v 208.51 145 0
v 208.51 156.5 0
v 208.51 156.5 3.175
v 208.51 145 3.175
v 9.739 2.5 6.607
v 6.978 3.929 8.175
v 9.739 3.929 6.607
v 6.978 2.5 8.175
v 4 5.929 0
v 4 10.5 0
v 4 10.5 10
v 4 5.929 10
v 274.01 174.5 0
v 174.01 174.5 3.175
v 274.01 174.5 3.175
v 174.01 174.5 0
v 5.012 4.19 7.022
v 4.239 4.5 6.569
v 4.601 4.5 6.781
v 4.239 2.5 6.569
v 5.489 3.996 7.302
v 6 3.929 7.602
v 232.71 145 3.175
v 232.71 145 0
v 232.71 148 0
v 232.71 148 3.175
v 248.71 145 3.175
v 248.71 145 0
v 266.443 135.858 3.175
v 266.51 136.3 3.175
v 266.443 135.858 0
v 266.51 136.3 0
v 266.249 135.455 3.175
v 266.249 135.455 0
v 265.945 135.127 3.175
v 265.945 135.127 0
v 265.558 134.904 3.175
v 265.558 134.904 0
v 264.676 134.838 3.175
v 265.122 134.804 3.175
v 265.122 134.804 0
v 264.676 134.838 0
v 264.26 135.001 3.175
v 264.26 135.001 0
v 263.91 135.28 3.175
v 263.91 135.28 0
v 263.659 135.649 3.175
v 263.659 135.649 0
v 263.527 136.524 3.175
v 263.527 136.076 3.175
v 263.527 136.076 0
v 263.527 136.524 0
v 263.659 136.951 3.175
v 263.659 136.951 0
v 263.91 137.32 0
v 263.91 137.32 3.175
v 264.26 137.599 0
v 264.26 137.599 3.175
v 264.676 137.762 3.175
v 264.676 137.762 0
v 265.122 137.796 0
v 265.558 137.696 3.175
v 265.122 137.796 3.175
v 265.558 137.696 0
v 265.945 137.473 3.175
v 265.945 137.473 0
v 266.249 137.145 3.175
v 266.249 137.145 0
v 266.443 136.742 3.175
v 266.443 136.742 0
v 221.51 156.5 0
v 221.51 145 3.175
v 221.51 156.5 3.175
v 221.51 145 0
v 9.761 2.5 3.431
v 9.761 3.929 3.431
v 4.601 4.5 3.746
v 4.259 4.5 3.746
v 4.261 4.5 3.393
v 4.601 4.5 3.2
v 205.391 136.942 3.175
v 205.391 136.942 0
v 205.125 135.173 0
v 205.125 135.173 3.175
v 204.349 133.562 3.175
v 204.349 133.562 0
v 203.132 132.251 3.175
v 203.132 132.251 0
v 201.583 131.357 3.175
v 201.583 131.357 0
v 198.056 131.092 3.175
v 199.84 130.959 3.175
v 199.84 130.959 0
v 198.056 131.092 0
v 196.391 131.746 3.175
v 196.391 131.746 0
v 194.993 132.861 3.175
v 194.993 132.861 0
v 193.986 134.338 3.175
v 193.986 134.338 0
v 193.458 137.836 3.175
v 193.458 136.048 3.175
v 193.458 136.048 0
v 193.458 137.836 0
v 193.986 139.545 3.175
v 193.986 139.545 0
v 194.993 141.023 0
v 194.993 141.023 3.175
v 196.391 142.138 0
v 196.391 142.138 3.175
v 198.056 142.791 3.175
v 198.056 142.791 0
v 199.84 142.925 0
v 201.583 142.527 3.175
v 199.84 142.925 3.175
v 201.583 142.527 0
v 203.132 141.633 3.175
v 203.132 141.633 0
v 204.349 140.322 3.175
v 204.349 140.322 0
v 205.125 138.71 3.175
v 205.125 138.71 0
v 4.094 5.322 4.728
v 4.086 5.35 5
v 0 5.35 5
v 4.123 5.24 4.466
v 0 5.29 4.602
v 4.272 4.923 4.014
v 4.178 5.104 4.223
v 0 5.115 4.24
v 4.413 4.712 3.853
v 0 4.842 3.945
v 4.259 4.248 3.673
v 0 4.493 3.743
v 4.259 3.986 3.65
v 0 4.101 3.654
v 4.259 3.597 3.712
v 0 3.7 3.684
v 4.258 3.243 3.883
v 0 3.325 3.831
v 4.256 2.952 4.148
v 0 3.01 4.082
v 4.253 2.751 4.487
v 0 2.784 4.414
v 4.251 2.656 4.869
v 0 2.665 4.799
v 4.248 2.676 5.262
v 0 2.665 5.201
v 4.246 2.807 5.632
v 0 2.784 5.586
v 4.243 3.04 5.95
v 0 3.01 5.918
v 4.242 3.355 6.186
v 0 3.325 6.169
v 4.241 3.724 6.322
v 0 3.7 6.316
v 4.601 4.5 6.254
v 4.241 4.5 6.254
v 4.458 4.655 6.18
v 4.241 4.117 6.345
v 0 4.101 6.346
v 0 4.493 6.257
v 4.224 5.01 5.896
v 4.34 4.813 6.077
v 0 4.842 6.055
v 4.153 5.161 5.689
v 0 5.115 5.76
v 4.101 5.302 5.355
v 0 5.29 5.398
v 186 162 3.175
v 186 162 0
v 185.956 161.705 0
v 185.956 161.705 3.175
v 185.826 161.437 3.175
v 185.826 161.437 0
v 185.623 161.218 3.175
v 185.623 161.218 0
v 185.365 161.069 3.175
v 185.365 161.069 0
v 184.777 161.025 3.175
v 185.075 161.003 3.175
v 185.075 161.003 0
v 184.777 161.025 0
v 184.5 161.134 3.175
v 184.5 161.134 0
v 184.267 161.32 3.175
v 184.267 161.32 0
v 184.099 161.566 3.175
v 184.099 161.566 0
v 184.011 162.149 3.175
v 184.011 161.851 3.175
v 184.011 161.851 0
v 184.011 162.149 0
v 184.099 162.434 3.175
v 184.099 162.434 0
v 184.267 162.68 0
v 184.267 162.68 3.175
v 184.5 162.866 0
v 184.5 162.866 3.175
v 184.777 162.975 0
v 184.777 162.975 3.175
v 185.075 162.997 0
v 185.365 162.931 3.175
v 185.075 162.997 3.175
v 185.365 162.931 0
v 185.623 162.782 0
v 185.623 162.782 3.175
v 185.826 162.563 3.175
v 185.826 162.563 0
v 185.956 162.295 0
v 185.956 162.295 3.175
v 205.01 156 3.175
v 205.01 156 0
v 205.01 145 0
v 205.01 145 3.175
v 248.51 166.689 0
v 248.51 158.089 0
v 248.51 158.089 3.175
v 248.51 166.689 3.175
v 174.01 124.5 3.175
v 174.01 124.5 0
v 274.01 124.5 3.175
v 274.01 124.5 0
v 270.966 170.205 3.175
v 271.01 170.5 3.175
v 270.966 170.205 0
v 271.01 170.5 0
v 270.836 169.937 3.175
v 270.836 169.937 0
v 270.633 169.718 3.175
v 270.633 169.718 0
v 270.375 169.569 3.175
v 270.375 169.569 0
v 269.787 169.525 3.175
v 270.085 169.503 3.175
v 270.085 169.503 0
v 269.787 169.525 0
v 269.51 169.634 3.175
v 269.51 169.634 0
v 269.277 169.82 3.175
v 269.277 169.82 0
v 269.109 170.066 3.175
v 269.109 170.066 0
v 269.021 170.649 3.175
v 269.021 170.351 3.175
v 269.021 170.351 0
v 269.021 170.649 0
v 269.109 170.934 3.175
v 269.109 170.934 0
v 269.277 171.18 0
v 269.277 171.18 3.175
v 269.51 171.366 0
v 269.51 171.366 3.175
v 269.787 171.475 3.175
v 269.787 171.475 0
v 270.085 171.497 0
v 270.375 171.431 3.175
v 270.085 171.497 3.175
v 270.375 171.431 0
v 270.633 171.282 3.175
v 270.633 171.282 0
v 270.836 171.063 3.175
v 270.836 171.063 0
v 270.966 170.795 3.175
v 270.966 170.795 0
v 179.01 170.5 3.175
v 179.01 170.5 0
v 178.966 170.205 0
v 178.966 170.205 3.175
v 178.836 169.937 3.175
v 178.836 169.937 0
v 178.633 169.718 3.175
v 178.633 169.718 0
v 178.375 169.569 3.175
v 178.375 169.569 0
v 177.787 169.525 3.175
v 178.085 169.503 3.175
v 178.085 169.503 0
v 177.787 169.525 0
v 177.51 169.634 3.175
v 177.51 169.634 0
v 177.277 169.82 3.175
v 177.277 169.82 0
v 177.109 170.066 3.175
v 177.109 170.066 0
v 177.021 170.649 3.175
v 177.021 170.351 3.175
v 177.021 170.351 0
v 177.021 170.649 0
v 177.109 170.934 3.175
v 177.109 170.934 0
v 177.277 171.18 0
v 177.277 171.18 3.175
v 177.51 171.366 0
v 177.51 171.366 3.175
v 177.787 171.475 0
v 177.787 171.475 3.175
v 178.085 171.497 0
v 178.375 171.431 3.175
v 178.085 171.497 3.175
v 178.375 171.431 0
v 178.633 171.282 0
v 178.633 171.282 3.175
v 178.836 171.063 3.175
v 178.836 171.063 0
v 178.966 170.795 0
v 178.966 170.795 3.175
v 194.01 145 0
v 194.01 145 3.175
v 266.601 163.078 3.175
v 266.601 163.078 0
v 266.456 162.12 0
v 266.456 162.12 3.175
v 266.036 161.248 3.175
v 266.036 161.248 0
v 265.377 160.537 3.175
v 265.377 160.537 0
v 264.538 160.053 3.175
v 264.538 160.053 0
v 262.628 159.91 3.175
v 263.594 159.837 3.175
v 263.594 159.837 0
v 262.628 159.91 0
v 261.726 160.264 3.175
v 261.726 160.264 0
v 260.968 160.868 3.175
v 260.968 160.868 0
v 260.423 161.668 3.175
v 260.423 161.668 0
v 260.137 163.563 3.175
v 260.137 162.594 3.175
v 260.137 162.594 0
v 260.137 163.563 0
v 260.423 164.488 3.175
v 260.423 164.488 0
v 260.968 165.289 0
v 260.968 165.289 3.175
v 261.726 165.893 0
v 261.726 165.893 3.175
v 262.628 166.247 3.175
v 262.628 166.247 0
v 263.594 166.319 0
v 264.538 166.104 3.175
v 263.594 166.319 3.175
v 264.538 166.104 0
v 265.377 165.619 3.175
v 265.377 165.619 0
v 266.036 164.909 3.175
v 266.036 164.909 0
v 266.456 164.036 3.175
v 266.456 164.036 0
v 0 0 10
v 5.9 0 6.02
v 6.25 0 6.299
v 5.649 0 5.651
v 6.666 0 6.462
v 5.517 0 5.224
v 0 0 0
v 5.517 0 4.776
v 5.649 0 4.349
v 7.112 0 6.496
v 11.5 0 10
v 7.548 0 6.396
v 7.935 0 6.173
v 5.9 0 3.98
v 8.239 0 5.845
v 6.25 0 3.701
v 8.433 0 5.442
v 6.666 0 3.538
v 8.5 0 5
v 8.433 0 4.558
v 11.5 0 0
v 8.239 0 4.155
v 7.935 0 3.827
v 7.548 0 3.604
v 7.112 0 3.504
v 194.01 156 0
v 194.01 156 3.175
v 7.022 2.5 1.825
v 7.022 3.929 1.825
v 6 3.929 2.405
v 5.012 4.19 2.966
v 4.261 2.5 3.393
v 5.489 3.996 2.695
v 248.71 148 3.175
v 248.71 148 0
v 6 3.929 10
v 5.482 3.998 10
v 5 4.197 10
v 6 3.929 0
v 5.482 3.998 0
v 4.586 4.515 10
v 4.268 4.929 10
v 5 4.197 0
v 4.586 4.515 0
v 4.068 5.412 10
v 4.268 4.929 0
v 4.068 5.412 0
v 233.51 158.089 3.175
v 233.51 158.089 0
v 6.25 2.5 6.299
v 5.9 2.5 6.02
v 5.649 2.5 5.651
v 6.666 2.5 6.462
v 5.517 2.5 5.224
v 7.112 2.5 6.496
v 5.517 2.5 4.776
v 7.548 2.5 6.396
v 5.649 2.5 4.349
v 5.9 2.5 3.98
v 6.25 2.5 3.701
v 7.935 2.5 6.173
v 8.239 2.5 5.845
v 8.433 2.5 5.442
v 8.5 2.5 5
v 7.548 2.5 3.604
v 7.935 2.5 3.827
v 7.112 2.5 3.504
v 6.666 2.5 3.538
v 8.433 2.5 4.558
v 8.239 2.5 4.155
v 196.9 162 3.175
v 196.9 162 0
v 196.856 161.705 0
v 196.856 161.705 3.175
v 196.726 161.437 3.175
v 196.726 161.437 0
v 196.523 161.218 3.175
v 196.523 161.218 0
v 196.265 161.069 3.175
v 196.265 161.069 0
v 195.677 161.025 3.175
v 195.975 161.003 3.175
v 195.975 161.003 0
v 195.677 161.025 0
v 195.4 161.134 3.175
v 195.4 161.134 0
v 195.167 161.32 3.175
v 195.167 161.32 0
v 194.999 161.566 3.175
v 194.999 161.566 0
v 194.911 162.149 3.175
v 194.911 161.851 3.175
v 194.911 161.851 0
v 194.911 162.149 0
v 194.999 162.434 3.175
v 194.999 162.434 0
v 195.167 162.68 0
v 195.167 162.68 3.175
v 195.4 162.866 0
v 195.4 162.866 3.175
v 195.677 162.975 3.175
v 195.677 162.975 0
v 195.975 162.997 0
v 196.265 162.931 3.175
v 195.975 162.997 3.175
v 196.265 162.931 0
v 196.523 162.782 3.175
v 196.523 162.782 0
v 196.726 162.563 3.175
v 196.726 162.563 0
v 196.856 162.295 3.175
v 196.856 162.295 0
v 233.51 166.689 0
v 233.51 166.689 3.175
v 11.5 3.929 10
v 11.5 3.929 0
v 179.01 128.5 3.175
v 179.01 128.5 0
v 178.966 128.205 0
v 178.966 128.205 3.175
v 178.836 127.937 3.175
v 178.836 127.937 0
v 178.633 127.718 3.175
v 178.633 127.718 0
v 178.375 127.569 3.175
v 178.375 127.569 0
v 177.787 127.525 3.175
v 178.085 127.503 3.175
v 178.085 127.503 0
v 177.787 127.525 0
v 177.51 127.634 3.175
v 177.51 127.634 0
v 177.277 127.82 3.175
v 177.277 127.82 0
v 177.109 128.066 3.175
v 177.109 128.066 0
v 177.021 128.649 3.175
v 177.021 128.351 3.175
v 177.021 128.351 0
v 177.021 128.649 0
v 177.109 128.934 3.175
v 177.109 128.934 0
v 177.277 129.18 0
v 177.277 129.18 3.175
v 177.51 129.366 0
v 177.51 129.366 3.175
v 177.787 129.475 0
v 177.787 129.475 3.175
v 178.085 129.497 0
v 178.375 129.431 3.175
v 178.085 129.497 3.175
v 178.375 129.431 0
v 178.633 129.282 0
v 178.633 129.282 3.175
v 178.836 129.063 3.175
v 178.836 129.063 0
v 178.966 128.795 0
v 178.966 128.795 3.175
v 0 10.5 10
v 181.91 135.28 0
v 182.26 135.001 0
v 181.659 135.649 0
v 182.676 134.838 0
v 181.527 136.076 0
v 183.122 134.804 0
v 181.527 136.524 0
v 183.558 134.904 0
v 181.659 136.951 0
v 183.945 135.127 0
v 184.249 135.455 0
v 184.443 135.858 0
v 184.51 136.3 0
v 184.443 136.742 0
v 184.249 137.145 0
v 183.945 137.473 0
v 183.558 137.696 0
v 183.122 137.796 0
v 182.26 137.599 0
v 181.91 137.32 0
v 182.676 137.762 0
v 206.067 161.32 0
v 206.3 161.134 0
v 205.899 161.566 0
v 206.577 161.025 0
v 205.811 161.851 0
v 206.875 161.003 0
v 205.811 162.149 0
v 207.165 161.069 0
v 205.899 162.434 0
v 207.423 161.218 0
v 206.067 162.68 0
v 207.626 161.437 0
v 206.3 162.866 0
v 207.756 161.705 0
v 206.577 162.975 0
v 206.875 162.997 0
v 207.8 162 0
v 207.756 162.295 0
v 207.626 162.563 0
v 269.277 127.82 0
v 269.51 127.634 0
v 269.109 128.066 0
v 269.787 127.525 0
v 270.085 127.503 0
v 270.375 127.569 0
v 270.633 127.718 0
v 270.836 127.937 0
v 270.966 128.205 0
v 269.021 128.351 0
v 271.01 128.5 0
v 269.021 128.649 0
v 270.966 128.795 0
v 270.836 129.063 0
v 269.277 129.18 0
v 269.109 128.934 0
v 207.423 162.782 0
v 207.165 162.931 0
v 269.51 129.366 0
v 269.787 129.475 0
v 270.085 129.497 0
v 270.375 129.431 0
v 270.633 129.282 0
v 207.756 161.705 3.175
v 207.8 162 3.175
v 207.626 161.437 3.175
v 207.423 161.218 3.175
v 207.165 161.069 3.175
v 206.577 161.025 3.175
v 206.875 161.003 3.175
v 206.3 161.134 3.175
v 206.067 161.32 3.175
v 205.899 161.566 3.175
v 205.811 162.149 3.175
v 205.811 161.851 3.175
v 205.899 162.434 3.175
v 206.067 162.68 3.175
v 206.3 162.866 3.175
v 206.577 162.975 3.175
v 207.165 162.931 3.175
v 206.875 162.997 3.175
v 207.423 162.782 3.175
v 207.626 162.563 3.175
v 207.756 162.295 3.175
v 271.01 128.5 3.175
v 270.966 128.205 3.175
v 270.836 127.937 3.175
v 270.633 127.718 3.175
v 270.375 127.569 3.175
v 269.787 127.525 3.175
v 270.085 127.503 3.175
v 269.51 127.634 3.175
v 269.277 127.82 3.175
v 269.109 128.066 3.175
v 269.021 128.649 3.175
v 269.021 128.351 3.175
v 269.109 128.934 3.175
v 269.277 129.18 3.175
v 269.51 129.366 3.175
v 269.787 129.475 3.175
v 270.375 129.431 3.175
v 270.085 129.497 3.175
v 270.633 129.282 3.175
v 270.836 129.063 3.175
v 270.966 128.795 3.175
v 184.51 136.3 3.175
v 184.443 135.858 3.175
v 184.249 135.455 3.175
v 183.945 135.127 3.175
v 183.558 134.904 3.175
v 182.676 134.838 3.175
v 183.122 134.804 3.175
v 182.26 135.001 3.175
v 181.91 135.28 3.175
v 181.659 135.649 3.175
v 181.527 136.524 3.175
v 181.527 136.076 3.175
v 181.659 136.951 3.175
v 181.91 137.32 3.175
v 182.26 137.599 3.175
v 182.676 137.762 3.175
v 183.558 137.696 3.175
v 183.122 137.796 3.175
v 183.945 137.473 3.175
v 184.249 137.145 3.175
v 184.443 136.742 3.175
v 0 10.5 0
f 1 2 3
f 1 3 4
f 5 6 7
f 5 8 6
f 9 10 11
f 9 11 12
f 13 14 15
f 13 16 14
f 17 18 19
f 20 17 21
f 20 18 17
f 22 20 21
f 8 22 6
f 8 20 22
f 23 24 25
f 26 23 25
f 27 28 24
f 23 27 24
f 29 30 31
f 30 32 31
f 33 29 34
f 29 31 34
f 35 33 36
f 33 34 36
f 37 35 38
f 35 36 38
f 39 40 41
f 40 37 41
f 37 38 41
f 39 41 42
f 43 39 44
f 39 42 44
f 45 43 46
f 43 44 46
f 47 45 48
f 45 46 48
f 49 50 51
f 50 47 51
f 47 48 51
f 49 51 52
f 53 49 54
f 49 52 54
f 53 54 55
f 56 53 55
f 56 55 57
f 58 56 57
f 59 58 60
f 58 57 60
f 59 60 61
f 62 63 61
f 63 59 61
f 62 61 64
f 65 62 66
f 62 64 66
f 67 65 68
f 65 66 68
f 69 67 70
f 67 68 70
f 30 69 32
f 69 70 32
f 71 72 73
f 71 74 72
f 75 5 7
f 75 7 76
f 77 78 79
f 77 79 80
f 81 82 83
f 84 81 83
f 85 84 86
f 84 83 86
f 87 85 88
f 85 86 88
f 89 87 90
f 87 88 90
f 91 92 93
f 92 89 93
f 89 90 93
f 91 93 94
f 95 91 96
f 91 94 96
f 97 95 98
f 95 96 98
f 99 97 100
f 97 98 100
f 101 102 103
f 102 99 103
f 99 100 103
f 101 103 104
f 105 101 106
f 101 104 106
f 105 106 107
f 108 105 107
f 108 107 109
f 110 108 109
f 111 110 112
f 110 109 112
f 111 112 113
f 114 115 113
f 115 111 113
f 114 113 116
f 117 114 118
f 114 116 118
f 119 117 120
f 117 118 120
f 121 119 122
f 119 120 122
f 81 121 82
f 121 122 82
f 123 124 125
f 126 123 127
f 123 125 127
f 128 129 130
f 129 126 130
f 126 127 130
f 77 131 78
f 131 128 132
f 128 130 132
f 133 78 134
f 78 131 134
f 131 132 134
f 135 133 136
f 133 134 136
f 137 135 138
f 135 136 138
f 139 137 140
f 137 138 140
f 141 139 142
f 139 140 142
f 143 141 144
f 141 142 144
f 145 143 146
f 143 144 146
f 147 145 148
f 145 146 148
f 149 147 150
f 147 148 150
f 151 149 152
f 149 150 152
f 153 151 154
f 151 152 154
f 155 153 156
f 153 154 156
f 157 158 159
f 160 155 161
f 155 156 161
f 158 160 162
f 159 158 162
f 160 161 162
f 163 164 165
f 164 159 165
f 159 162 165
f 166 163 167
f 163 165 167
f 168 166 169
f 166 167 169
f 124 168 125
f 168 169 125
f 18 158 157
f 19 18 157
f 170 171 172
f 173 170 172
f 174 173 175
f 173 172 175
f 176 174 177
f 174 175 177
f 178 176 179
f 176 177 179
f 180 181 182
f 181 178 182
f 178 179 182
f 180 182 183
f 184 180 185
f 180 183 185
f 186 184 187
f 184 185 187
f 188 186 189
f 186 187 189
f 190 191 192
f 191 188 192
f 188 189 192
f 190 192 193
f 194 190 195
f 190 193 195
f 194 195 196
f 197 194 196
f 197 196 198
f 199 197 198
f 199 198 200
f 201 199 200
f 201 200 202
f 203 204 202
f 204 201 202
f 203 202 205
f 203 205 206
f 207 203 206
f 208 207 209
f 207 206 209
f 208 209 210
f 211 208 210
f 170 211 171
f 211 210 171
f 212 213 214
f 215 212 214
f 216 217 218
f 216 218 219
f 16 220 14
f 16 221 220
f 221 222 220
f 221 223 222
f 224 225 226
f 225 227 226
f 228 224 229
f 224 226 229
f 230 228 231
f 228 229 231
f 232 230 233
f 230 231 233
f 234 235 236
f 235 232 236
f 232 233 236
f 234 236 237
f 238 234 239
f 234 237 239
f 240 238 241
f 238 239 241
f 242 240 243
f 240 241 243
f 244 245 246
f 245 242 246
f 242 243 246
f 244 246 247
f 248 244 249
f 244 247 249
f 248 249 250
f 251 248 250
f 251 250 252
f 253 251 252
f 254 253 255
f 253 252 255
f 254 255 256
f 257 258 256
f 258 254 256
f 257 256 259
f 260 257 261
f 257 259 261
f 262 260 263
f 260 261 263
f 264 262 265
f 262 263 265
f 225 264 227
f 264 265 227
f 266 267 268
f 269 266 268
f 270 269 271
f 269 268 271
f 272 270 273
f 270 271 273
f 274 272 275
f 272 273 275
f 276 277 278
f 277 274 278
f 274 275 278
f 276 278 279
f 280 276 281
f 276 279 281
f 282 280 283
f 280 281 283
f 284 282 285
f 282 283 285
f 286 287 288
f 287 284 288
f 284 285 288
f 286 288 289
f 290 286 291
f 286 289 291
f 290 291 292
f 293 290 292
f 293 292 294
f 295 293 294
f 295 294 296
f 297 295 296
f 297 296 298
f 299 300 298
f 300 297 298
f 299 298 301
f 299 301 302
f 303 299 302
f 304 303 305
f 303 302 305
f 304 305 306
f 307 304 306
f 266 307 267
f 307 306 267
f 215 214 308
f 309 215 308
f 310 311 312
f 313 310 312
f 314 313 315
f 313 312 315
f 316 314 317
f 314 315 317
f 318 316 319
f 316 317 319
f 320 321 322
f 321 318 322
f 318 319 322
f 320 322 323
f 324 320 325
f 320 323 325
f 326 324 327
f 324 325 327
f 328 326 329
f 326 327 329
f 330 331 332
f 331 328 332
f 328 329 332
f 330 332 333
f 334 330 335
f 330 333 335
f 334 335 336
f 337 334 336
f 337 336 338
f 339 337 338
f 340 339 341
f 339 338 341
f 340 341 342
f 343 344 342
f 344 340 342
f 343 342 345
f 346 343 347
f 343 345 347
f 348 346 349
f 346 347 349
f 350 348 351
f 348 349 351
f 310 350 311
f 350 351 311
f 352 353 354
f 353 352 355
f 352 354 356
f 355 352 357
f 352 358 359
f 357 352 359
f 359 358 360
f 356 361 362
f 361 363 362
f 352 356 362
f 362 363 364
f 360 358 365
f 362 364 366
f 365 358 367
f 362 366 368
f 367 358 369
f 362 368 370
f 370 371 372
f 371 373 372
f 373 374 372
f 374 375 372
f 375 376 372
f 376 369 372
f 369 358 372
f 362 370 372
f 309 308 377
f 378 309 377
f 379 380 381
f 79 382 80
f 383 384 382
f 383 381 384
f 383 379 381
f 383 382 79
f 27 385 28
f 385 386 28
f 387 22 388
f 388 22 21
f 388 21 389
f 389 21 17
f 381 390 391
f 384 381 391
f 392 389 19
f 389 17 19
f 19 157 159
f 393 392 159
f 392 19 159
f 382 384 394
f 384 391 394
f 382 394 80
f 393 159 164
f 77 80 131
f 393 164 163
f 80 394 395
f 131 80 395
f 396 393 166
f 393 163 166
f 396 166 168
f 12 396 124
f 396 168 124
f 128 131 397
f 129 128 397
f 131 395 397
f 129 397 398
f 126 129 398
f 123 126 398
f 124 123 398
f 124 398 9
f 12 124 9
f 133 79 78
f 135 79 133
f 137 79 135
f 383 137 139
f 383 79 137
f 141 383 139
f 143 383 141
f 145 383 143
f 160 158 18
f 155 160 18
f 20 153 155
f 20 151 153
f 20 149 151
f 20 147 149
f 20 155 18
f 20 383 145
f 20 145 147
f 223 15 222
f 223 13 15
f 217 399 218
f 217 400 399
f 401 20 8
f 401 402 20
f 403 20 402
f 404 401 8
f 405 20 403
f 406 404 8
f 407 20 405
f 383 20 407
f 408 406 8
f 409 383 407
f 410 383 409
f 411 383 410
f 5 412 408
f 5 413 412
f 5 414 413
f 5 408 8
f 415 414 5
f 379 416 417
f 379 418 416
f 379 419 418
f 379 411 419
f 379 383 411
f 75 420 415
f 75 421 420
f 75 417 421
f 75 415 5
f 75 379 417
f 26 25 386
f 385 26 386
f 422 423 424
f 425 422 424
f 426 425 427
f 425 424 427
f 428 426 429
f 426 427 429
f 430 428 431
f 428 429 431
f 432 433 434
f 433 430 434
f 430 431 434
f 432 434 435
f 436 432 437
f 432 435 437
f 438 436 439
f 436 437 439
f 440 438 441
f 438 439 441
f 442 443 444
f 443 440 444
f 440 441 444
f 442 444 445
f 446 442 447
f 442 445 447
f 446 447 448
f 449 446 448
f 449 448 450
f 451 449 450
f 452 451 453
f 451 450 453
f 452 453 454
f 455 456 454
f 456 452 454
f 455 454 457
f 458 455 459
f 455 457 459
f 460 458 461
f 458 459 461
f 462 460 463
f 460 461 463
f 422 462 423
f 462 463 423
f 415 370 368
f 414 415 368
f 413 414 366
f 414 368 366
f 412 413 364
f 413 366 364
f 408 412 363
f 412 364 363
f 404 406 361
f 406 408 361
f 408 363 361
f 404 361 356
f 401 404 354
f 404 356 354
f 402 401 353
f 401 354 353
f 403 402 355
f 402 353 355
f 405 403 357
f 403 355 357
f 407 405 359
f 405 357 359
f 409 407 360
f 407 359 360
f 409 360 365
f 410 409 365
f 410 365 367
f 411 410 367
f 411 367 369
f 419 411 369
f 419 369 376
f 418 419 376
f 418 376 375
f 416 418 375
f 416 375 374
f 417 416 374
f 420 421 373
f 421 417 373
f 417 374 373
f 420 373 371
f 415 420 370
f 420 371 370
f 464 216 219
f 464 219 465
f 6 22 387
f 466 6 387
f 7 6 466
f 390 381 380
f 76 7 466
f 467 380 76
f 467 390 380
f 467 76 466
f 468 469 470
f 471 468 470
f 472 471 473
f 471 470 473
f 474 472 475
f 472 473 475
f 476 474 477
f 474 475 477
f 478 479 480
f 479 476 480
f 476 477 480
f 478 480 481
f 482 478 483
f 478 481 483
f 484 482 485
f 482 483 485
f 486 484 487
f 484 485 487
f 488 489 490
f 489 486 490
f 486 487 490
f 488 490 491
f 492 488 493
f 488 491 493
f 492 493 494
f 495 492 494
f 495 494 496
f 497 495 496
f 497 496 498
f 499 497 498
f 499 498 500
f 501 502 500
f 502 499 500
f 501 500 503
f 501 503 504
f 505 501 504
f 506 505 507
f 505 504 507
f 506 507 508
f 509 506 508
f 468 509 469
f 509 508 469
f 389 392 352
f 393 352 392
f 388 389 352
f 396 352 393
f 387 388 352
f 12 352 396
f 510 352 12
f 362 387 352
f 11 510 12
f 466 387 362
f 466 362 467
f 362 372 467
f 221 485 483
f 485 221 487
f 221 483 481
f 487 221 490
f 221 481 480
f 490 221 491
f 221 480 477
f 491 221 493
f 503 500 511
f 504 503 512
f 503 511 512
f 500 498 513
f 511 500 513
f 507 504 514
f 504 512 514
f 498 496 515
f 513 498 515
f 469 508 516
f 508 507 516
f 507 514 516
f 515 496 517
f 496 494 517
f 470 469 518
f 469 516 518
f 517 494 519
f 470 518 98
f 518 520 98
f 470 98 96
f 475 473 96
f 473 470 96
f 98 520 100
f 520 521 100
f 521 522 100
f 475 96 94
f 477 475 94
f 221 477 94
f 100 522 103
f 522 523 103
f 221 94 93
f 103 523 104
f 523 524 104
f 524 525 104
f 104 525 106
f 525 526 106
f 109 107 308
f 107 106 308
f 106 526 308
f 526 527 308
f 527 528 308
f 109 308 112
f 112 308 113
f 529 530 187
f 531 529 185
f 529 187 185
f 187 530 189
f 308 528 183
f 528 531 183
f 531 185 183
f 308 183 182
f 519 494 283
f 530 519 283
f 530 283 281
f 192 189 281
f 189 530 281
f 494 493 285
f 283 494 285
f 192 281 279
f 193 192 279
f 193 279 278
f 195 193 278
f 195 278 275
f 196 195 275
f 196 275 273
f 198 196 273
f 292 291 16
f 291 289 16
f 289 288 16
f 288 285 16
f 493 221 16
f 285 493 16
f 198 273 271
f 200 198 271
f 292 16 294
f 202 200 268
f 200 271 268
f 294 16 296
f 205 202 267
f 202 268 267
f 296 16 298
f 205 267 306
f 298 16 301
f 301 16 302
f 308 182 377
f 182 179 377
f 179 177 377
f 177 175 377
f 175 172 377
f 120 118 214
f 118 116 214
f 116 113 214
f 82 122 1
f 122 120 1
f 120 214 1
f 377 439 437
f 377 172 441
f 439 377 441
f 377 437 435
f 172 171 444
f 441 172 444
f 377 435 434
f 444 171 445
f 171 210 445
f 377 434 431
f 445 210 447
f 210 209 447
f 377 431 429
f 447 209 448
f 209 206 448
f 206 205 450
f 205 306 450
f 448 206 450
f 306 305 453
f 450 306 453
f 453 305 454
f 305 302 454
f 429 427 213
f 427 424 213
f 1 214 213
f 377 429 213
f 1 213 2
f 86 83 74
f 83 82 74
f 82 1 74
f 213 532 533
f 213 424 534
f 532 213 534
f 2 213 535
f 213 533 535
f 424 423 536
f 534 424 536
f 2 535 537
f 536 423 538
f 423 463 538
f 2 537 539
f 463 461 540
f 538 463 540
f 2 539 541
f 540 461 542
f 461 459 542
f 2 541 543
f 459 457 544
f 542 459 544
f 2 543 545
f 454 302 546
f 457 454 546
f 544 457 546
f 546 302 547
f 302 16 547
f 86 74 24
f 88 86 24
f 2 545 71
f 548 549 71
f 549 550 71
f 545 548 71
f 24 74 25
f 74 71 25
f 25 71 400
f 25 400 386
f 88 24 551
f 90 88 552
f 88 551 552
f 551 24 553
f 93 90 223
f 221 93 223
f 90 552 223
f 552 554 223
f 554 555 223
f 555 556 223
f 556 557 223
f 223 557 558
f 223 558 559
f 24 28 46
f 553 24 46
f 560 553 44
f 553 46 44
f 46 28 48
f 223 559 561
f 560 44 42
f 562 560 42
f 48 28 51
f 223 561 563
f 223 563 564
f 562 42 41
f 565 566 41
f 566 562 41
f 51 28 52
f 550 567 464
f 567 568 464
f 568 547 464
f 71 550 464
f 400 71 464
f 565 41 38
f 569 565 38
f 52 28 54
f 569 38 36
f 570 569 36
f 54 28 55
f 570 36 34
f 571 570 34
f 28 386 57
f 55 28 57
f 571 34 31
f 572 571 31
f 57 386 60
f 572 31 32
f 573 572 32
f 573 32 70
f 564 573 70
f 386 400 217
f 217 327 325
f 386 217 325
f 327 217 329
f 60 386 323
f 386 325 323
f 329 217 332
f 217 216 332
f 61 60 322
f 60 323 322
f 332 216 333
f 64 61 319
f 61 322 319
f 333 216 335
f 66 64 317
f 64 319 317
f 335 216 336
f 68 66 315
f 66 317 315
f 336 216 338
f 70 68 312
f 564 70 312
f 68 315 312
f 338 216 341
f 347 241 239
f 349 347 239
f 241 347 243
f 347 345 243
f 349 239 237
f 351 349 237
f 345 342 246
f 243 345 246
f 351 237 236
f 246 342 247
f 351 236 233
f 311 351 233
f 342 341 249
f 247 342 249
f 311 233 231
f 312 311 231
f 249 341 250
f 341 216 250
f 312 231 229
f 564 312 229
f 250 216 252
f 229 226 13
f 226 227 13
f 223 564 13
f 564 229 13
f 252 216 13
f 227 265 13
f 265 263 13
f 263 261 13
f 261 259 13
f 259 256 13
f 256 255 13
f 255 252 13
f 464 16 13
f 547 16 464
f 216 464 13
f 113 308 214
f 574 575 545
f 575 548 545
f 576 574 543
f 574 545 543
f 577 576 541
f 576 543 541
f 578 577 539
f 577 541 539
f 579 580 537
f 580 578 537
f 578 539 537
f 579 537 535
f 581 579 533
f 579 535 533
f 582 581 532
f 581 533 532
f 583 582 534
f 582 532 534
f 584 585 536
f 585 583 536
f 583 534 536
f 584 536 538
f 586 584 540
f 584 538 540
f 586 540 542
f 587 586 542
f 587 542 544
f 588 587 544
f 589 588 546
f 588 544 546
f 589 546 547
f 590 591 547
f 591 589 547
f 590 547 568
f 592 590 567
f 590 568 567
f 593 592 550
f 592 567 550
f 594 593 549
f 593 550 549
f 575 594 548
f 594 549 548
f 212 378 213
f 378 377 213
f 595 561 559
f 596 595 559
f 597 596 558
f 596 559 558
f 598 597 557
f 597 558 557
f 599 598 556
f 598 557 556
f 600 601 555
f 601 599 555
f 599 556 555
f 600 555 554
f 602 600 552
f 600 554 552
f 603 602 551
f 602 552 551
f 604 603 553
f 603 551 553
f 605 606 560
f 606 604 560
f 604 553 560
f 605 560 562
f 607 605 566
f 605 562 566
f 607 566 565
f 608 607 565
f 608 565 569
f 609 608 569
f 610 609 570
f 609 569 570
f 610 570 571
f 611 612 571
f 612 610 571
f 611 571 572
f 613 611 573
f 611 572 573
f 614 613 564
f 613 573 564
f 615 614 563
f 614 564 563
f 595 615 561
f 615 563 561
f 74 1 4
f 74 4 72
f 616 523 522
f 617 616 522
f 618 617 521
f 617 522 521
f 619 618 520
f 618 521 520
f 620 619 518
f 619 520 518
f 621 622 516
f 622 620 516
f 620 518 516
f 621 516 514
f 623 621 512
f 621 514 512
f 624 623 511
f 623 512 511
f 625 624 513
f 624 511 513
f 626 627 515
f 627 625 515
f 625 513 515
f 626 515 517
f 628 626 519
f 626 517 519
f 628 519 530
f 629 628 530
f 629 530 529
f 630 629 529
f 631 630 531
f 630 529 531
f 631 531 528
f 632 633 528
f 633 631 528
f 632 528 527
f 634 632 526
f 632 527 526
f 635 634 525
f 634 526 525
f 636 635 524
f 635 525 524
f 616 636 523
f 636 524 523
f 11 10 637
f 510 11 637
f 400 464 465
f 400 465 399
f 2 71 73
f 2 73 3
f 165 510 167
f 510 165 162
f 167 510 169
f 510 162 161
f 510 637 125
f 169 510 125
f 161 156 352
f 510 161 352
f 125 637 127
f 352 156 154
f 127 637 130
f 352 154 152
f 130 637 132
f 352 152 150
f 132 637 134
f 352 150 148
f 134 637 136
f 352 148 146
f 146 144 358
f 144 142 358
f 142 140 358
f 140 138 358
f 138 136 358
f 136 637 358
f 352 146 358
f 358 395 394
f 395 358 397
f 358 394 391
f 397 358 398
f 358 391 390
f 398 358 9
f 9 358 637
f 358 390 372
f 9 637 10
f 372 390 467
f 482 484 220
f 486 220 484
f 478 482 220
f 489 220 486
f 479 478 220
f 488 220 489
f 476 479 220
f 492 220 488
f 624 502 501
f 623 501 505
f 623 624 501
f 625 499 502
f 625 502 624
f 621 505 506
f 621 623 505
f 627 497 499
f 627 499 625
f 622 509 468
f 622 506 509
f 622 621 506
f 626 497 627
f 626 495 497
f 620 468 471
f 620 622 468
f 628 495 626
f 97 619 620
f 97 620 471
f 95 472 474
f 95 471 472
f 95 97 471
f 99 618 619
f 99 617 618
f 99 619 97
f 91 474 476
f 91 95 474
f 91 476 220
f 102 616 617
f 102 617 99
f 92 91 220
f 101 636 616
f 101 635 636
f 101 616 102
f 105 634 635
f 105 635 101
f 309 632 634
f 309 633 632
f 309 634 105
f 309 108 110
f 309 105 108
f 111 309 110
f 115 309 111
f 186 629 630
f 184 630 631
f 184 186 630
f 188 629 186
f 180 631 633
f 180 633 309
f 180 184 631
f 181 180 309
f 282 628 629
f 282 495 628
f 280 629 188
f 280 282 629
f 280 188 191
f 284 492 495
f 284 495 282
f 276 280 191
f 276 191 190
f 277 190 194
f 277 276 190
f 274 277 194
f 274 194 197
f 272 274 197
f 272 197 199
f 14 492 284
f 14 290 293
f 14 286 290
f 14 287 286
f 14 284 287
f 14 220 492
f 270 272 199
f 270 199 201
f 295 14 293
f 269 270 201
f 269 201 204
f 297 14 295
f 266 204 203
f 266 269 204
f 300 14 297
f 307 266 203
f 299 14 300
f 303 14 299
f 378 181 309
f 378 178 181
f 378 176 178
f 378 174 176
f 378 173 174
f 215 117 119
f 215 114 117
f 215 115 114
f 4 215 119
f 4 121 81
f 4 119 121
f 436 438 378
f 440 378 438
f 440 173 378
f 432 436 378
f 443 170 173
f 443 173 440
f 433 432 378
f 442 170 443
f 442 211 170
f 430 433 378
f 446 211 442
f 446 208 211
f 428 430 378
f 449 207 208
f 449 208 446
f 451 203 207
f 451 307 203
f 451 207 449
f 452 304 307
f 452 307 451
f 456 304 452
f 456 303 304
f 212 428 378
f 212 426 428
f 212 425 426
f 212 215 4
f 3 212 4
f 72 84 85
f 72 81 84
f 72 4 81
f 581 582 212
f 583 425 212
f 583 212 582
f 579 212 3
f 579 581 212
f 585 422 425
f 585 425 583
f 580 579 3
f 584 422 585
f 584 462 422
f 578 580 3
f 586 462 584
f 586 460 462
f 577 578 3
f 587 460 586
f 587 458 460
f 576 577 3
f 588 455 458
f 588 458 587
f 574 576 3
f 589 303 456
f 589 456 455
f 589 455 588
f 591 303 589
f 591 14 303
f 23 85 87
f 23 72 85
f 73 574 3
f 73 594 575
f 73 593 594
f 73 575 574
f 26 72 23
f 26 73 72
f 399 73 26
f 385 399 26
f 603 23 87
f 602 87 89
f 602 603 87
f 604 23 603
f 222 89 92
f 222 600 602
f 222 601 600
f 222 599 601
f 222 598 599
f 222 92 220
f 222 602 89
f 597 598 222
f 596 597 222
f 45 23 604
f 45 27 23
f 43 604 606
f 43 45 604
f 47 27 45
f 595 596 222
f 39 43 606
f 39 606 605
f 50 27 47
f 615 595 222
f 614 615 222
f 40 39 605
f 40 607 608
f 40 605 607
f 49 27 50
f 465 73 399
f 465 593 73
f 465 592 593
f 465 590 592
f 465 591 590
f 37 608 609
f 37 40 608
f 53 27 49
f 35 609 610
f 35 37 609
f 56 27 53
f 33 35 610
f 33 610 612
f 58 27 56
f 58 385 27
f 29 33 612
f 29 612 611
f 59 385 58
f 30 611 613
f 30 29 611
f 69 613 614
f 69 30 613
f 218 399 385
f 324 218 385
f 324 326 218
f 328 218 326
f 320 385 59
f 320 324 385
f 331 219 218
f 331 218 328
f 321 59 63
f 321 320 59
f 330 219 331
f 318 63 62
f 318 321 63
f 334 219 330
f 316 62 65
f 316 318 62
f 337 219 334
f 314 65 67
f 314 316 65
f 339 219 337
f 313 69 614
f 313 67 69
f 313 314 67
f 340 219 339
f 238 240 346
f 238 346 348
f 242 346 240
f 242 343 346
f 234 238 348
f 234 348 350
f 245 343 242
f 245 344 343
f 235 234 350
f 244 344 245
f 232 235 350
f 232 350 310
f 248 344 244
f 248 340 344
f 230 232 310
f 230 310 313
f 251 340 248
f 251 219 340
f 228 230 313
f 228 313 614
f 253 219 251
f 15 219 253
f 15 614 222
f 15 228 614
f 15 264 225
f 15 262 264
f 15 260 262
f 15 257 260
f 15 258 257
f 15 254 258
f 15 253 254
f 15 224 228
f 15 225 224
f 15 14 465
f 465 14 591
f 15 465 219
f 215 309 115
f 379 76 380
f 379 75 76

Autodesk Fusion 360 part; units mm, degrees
sketch "back content" plane through (0, 0, 0) normal (0, 0, 1) x (1, 0, 0)
  line L0 (174.01, 174.5) -> (274.01, 174.5)
  line L1 (274.01, 174.5) -> (274.01, 124.5)
  line L2 (274.01, 124.5) -> (174.01, 124.5)
  line L3 (174.01, 124.5) -> (174.01, 174.5)
  line L4 (205.01, 145) -> (194.01, 145)
  line L5 (194.01, 145) -> (194.01, 156)
  line L6 (194.01, 156) -> (205.01, 156)
  line L7 (205.01, 156) -> (205.01, 145)
  line L8 (205.01, 145) -> (194.01, 156) construction
  line L9 (194.01, 145) -> (205.01, 156) construction
  line L10 (182.01, 145) -> (246, 145) construction
  line L11 (221.51, 156.5) -> (208.51, 156.5)
  line L12 (208.51, 156.5) -> (208.51, 145)
  line L13 (208.51, 145) -> (221.51, 145)
  line L14 (221.51, 145) -> (221.51, 156.5)
  line L15 (221.51, 156.5) -> (208.51, 145) construction
  line L16 (208.51, 156.5) -> (221.51, 145) construction
  line L17 (248.71, 145) -> (232.71, 145)
  line L18 (232.71, 145) -> (232.71, 148)
  line L19 (232.71, 148) -> (248.71, 148)
  line L20 (248.71, 148) -> (248.71, 145)
  line L21 (248.71, 145) -> (232.71, 148) construction
  line L22 (232.71, 145) -> (248.71, 148) construction
  line L23 (233.51, 158.089) -> (248.51, 158.089)
  line L24 (248.51, 158.089) -> (248.51, 166.689)
  line L25 (248.51, 166.689) -> (233.51, 166.689)
  line L26 (233.51, 166.689) -> (233.51, 158.089)
  circle A0 centre (178.01, 128.5) radius 1
  line L27 (224.01, 174.5) -> (224.01, 124) construction
  line L28 (174.01, 149.5) -> (274.01, 149.5) construction
  circle A1 centre (270.01, 128.5) radius 1
  circle A2 centre (270.01, 170.5) radius 1
  circle A3 centre (178.01, 170.5) radius 1
  circle A4 centre (265.01, 136.3) radius 1.5
  circle A5 centre (183.01, 136.3) radius 1.5
  circle A6 centre (263.3507, 163.0783) radius 3.25
  circle A7 centre (185, 162) radius 1
  circle A8 centre (195.9, 162) radius 1
  circle A9 centre (206.8, 162) radius 1
  circle A10 centre (199.3914, 136.9418) radius 6
  point P0 (199.51, 150.5)
  point P1 (215.01, 150.75)
  point P2 (240.71, 146.5)
  point P3 (195.6, 162)
  point P4 (206.2, 162)
  point P5 (216.8, 162)
  dimension "d381" = 100
  dimension "d382" = 50
  dimension "d5984" = 20.5
  dimension "d5985" = 11
  dimension "d5986" = 11
  dimension "d5988" = 13
  dimension "d5990" = 11.5
  dimension "d5991" = 16
  dimension "d5992" = 3
  dimension "d5998" = 15
  dimension "d5999" = 8.6
  dimension "d6001" = 2
  dimension "d6012" = 46
  dimension "d6013" = 21
  dimension "d6014" = 41
  dimension "d6015" = 3
  dimension "d6040" = 6.5
  dimension "d6041" = 24.5
  dimension "d6043" = 224.01
  dimension "d6044" = 16.7
  dimension "d6045" = 9
  dimension "d6046" = 9.5
  dimension "d6047" = 174.5
  dimension "d6048" = 8.7
  dimension "d6050" = 2
  dimension "d6053" = 10.6
  dimension "d6054" = 0
  dimension "d6057" = 21.8
  dimension "d6058" = 0
  dimension "d6067" = 12
sketch "bracket" plane through (0, 0, 0) normal (0, 0, 1) x (1, 0, 0) in component "brackets"
  line L0 (0, 0) -> (11.5, 0)
  line L1 (11.5, 0) -> (11.5, 3.9294)
  line L2 (4, 10.5) -> (0, 10.5)
  line L3 (0, 10.5) -> (0, 0)
  line L4 (6, 3.9294) -> (11.5, 3.9294)
  line L5 (4, 10.5) -> (4, 5.9294)
  arc A0 (4, 5.9294) -> (6, 3.9294) centre (6, 5.9294) ccw
  point P0 (4, 3.9294)
  dimension "d6022" = 11.5
  dimension "d6023" = 10.5
  dimension "d6025" = 2
  dimension "d6049" = 4
extrude "Extrude2" add sketch "bracket" along normal blind 10 makes body 1 in component "brackets"
sketch "BackingToBracketHole" plane through (0, 0, 0) normal (0, 1, 0) x (1, 0, 0) in component "brackets"
  circle A0 centre (7, -5) radius 1.5
  line L0 (0, 0) -> (0, -10)
  circle A1 centre (7, -5) radius 2.9 construction
  line L1 (6.9779, -8.1753) -> (9.7389, -6.6068)
  line L2 (9.7389, -6.6068) -> (9.761, -3.4314)
  line L3 (9.761, -3.4314) -> (7.0221, -1.8247)
  line L4 (7.0221, -1.8247) -> (4.2611, -3.3932)
  line L5 (4.2611, -3.3932) -> (4.239, -6.5686)
  line L6 (4.239, -6.5686) -> (6.9779, -8.1753)
  point P0 (4, 0)
  point P1 (7, -5)
  dimension "d6028" = 3
  dimension "d6029" = 5
  dimension "d6030" = 7
  dimension "d6061" = 5.8
extrude "Extrude5" cut sketch "BackingToBracketHole" along normal blind 2 from surface at 2.5 bodies 1 in component "brackets"
extrude "Extrude3" cut sketch "BackingToBracketHole" along normal blind 4 contours A0 bodies 1 in component "brackets"
sketch "BracketToPCB" plane through (0, 0, 0) normal (1, 0, 0) x (0, 1, 0) in component "brackets"
  circle A0 centre (4, 5) radius 1.35
  line L0 (10.5, 0) -> (0, 0)
  dimension "d6034" = 2.7
  dimension "d6035" = 5
  dimension "d6036" = 4
extrude "Extrude6" cut sketch "BracketToPCB" along normal blind 5 bodies 1 in component "brackets"
extrude "Extrude49" add sketch "back content" along normal blind 3.175 separate body makes body 2
component "brackets" placed x (1, 0, 0) y (0, 1, 0) z (0, 0, 1) at (0, 0, 0)
equation "platformMountHoles = 3 mm"
equation "pcbMountHoles = 2 mm"
equation "b_Length = 150.00 mm" comment "Length (mm)"
equation "b_Depth = 120.00 mm" comment "Depth (mm)"
equation "b_Height = 65.00 mm" comment "Height (mm)"
equation "b_Thickness = 3.175 mm" comment "Thickness (mm)"
equation "b_Tool_diameter = 2.01 mm" comment "Tool Diameter (mm)"
equation "b_Tooth_width = 10.00 mm" comment "Target Tooth Width (mm)"
equation "b_Kerf = -0.16 mm" comment "Kerf (mm)- can be negative"
equation "b_Delta_from_bottom = -0.10 mm" comment "Additional fine adjustment of bone centers from bottom of holes(mm)- positive makes smaller bottom indents"
equation "b_Stock_x_dimension = 304.80 mm" comment "Stock X Dimension *"
equation "b_Stock_y_dimension = 609.60 mm" comment "Stock Y Dimension"
equation "b_Repeats_l_tmp = -1.00 mm" comment "temp hidden"
equation "Version_info = 0 mm" comment "1.2.0 LENGTH 150.0 DEPTH 120.0 HEIGHT 65.0 THICKNESS 3.175 TOOL_DIAMETER 2.01 TOOTH_WIDTH 10.0 KERF -0.16 DELTA_FROM_BOTTOM -0.1 STOCK_X_DIMENSION 304.8 STOCK_Y_DIMENSION 609.6 COMPONENT  REPEATS_L_TMP -1 CREATE_COMPONENTS False CREATE_BODIES 1 CREATE_EMPTY_CONTENTS False CREATE_CONSTRAINTS True CLEAR_PREVIOUSLY_GENERATED_ITEMS True JUST_CLEAR_PREVIOUSLY_GENERATED_ITEMS False CREATE_MANUFACTURING False JUST_CREATE_MANUFACTURING False DEBUG_JUST_ONE_PART False MANUAL_LAYOUT  LASER False JUST_BUILD_TEST False DEBUG True"
equation "shaftCenterToCenter = 34 mm"
equation "shaftCenterToMountingHoles = 15.5 mm"
equation "ballBearingHoleDiam = 12.8 mm"
equation "ballBearingCenterToCenterHoriz = 55 mm"
equation "ballBearingCenterToCenterVert = 40 mm"
equation "Dlc32Length = 82 mm"
equation "d6001 = pcbMountHoles"
equation "d6050 = pcbMountHoles"
equation "d6059 = b_Thickness"
